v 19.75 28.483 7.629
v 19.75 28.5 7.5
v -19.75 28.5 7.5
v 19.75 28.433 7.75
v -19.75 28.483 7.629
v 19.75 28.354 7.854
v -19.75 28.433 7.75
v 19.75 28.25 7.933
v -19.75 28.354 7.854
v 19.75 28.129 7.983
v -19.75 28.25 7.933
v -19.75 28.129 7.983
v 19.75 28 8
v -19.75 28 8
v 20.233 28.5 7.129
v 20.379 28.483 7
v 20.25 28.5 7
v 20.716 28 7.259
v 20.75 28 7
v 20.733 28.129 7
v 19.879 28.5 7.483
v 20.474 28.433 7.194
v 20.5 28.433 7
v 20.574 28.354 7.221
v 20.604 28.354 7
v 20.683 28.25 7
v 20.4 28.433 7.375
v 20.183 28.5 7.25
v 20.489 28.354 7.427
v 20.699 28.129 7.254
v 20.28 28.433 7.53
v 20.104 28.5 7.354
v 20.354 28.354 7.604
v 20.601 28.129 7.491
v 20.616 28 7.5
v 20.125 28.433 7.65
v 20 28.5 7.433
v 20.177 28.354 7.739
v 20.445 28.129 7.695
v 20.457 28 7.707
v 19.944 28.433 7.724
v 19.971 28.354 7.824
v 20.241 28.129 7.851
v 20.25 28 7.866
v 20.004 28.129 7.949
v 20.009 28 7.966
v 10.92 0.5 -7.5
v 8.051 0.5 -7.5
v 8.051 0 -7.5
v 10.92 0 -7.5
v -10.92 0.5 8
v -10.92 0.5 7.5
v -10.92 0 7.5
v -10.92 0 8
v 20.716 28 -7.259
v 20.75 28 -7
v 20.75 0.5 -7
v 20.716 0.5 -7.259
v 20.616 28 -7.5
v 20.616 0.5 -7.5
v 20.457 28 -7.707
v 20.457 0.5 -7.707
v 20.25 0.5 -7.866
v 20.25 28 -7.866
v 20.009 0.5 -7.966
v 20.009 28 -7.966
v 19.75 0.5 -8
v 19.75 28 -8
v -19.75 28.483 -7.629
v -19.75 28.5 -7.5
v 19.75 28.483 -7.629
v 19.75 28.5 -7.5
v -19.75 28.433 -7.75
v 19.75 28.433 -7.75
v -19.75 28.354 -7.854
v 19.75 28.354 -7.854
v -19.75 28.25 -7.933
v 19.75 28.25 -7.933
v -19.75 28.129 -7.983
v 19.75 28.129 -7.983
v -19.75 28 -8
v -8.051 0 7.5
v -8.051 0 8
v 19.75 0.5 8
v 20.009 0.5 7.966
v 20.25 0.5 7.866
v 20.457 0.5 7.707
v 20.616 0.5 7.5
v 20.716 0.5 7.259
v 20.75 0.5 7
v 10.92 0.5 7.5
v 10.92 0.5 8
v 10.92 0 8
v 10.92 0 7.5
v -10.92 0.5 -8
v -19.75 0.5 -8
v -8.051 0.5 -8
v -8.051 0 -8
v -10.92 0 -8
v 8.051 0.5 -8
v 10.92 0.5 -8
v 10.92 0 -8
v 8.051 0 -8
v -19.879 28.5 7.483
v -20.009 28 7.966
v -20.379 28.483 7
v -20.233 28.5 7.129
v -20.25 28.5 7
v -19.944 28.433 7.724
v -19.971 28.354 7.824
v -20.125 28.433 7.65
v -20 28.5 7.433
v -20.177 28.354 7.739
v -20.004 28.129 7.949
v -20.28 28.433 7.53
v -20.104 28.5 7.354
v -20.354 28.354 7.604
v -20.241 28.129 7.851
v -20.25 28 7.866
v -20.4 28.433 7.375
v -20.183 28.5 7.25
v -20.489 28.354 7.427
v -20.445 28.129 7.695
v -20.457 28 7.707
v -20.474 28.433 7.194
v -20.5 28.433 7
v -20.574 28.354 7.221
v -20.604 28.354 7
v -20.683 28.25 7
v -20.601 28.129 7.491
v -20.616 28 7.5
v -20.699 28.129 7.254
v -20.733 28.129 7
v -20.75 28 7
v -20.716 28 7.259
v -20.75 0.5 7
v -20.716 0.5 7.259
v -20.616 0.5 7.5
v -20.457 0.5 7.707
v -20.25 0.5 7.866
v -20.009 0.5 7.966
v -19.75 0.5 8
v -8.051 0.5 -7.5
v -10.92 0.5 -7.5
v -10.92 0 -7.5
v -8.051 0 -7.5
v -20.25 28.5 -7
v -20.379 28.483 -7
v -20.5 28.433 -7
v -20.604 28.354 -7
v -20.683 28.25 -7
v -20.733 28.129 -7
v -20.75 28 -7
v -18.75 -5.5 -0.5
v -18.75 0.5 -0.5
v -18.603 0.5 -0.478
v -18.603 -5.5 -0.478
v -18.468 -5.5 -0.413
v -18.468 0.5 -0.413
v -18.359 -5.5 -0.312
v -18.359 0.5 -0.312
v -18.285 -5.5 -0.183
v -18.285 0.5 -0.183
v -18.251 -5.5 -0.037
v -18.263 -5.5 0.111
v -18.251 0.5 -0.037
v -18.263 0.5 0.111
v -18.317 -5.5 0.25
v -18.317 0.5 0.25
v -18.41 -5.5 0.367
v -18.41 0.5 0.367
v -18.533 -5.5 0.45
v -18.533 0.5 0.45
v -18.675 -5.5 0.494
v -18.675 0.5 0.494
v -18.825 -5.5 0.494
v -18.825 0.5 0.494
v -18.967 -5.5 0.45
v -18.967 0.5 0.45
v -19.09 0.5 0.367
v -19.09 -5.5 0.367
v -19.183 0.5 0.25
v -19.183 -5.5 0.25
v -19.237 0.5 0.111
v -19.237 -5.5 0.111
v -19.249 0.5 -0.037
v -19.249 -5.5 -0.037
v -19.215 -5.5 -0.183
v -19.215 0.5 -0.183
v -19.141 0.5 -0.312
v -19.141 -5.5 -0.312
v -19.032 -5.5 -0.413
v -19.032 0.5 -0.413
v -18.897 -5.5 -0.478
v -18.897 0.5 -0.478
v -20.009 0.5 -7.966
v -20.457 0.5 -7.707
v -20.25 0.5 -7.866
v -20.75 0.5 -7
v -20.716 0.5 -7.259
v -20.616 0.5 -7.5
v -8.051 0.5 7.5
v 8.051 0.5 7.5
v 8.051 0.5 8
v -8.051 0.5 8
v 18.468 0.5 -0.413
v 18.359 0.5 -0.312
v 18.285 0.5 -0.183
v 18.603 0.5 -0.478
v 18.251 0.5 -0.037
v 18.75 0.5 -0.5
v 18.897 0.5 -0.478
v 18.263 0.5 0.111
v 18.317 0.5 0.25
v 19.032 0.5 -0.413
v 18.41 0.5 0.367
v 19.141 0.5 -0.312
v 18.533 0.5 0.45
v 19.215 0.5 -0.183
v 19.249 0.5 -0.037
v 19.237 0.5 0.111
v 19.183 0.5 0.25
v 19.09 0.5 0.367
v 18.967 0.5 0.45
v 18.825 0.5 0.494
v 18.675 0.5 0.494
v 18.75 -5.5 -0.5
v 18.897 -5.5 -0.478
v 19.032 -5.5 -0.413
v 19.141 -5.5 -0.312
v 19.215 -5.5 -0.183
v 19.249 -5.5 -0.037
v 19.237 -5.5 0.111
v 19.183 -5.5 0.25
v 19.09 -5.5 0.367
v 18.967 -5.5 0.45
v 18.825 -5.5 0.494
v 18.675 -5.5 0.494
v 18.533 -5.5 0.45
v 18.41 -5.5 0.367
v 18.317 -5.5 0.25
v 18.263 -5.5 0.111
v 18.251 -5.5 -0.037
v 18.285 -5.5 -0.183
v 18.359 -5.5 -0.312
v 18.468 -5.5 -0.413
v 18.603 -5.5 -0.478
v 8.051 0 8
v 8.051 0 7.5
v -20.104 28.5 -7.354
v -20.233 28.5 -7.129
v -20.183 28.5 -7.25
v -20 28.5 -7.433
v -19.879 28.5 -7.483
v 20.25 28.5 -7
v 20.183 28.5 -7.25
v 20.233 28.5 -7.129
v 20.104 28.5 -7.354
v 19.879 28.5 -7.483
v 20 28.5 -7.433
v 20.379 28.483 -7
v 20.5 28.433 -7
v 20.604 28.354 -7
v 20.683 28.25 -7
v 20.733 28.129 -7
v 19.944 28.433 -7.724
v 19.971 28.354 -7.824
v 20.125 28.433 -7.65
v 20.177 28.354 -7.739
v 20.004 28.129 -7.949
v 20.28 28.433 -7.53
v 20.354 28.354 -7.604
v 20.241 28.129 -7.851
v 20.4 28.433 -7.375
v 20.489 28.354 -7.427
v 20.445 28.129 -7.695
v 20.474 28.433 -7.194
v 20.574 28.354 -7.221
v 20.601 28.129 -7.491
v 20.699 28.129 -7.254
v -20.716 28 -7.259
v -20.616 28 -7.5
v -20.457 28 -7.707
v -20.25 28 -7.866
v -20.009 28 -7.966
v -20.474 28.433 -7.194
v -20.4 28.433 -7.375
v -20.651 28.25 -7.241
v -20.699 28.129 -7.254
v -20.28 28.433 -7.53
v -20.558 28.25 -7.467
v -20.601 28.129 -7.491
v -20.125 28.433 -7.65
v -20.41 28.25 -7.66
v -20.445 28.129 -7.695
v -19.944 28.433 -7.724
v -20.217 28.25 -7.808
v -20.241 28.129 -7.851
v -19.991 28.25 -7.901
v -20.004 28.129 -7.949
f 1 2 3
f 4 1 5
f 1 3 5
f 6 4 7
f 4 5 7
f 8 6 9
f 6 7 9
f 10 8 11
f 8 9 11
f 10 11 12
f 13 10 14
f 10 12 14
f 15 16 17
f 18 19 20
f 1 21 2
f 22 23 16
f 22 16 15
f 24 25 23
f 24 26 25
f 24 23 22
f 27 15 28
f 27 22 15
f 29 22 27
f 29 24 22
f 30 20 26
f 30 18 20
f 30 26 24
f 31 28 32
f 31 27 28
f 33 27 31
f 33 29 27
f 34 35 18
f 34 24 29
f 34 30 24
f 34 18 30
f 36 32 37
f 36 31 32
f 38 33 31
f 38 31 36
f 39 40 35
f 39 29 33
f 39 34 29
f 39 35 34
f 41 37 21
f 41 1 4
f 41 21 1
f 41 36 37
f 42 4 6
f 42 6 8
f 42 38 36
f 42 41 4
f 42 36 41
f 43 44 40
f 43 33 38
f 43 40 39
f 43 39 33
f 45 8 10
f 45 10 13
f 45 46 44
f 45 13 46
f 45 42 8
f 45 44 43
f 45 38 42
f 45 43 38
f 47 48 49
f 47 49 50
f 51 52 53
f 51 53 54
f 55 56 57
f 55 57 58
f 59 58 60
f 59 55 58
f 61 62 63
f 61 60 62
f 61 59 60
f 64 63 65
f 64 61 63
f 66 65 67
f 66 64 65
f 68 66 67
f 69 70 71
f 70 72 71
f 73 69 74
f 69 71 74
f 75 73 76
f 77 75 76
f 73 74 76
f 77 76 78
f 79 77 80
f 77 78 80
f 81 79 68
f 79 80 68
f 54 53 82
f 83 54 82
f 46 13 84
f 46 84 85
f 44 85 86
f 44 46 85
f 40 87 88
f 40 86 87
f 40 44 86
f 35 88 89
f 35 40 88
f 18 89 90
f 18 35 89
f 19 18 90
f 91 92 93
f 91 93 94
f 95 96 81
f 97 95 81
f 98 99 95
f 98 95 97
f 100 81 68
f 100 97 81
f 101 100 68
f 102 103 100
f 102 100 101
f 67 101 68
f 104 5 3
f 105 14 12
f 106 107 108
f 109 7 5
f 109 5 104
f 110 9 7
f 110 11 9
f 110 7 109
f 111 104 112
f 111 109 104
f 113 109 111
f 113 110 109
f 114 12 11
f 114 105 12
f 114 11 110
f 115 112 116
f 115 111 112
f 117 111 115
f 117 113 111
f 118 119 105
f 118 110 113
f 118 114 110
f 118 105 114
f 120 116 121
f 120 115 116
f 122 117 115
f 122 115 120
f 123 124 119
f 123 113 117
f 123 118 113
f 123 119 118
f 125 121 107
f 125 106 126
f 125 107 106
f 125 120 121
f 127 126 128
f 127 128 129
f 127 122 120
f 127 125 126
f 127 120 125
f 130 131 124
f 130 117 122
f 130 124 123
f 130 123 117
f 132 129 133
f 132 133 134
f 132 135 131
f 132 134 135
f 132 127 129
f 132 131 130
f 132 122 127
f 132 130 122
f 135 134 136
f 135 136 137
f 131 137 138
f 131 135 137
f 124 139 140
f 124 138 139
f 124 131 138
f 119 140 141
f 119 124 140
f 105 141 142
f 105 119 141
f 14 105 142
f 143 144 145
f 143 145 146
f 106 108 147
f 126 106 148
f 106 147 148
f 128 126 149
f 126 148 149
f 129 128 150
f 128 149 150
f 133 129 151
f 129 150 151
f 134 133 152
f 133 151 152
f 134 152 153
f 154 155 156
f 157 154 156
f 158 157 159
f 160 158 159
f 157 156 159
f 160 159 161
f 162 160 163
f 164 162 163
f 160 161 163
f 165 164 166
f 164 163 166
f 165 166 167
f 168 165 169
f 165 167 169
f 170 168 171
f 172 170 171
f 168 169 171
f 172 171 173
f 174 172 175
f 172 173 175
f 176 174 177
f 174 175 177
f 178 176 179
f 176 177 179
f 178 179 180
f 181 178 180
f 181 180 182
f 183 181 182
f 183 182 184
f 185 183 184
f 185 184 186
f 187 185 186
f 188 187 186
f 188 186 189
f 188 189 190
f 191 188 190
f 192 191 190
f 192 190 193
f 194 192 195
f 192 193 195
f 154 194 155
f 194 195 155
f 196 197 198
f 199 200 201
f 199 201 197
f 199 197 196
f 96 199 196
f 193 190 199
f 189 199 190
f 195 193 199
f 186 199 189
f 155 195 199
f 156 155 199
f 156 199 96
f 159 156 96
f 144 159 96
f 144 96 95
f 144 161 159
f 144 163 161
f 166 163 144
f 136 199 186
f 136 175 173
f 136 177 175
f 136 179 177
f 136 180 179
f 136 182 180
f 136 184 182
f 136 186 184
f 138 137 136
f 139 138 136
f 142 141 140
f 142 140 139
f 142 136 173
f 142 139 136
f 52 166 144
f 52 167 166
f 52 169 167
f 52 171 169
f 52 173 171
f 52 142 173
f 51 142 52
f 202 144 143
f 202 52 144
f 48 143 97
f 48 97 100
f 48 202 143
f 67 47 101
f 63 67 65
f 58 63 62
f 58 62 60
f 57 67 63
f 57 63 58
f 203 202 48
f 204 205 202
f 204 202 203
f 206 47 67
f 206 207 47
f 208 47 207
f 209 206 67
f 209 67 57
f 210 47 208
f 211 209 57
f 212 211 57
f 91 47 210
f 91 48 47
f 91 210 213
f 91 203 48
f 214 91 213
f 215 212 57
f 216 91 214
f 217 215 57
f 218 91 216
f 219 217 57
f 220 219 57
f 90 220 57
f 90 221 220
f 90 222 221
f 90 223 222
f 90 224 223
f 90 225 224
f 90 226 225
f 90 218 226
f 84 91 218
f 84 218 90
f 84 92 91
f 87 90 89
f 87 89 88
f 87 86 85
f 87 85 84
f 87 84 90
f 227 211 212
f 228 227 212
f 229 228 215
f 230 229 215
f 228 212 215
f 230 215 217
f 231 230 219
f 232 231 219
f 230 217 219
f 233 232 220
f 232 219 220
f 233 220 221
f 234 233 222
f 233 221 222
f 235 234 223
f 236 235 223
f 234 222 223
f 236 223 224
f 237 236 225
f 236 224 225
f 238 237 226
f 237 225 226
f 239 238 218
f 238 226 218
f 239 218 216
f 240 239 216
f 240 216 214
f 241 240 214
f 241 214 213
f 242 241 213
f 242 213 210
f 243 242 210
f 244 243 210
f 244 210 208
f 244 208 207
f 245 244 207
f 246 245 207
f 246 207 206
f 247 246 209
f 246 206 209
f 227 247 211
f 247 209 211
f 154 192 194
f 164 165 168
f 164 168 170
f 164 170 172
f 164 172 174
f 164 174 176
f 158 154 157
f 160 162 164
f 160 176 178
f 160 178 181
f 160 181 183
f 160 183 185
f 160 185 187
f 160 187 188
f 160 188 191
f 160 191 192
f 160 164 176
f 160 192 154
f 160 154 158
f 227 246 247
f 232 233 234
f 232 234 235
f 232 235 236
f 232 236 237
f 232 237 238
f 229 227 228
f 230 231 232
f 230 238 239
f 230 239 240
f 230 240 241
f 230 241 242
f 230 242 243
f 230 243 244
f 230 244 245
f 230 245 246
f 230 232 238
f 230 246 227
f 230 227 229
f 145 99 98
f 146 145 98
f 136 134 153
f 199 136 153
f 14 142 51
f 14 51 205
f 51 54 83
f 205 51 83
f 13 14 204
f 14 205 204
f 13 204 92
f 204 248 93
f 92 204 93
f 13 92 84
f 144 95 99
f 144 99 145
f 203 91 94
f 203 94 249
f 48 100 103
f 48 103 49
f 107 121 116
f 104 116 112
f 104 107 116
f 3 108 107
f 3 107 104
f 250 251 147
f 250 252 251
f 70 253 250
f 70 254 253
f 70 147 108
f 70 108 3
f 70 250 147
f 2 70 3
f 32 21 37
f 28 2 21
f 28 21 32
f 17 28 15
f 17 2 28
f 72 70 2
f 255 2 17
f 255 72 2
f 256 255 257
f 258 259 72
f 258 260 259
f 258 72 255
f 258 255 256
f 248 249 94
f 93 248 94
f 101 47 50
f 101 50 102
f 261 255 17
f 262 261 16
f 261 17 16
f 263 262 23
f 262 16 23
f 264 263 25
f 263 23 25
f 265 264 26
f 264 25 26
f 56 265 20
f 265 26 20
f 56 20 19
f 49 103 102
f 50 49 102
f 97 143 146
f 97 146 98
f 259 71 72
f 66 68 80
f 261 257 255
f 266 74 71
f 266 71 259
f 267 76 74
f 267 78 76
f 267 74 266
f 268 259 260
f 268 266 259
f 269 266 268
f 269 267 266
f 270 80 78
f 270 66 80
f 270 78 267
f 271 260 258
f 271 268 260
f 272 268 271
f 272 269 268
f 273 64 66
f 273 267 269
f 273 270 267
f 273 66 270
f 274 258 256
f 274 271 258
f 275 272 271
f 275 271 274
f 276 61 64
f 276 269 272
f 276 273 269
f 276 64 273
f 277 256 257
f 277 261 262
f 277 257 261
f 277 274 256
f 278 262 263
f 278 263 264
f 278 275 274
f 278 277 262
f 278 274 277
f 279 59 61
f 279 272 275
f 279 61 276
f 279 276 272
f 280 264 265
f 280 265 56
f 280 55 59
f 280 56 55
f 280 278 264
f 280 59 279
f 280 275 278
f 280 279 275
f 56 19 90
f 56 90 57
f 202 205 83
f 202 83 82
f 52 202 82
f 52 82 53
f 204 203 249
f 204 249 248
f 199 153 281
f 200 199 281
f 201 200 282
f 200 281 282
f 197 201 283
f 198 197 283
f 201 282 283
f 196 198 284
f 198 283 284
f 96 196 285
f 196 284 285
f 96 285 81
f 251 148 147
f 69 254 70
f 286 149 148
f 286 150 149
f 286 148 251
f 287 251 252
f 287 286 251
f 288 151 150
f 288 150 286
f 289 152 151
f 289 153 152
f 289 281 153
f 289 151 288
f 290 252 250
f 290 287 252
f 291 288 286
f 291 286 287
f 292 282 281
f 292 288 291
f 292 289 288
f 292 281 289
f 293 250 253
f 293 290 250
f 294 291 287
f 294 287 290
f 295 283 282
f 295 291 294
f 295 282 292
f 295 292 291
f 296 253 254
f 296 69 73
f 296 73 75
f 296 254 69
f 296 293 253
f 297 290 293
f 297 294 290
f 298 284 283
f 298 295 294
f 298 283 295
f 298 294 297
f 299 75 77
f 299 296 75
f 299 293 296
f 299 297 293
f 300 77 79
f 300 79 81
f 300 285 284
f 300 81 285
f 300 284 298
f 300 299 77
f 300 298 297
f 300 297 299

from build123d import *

# Parameters (mm, degrees)
SKETCH_1_W          = 41.5
SKETCH_1_H          = 16
EXTRUDE_1_DEPTH     = 28.5
FILLET_1_R          = 1
FILLET_2_R          = 0.5
CUT_EXTRUDE_START   = -0.5
CUT_EXTRUDE_1_DEPTH = 0.5
SKETCH_4_R          = 0.5
EXTRUDE_2_DEPTH     = 6


with BuildPart() as part:
    # Эскиз1 → Бобышка-Вытянуть1 (new body)
    with BuildSketch(Plane(origin=(0, 0, 0), x_dir=(1, 0, 0), z_dir=(0, 1, 0))):
        Rectangle(SKETCH_1_W, SKETCH_1_H)
    extrude(amount=EXTRUDE_1_DEPTH)

    # Скругление1
    fillet_1_edges = [part.edges().sort_by_distance(p)[0] for p in [
        (20.75, 14.25, 8),
        (-20.75, 14.25, 8),
        (-20.75, 14.25, -8),
        (20.75, 14.25, -8),
    ]]
    fillet(fillet_1_edges, radius=FILLET_1_R)

    # Скругление2
    fillet_2_edges = [part.edges().sort_by_distance(p)[0] for p in [
        (0, 28.5, -8),
        (20.75, 28.5, 0),
        (-20.75, 28.5, 0),
        (0, 28.5, 8),
        (-20.457106781, 28.5, 7.707106781),
        (-20.457106781, 28.5, -7.707106781),
        (20.457106781, 28.5, 7.707106781),
        (20.457106781, 28.5, -7.707106781),
    ]]
    fillet(fillet_2_edges, radius=FILLET_2_R)

    # Эскиз3 → Вырез-Вытянуть1 (cut)
    with BuildSketch(Plane.XZ.offset(CUT_EXTRUDE_START)):
        with BuildLine():
            Line((-10.920111581, 7.5), (-10.920111581, 8))
            Line((-10.920111581, 8), (-19.75, 8))
            ThreePointArc((-19.75, 8), (-20.457106781, 7.707106781), (-20.75, 7))
            Line((-20.75, 7), (-20.75, -7))
            ThreePointArc((-20.75, -7), (-20.457106781, -7.707106781), (-19.75, -8))
            Line((-19.75, -8), (-10.920111581, -8))
            Line((-10.920111581, -8), (-10.920111581, -7.5))
            Line((-10.920111581, -7.5), (-8.050796548, -7.5))
            Line((-8.050796548, -7.5), (-8.050796548, -8))
            Line((-8.050796548, -8), (8.050796548, -8))
            Line((8.050796548, -8), (8.050796548, -7.5))
            Line((8.050796548, -7.5), (10.920111581, -7.5))
            Line((10.920111581, -7.5), (10.920111581, -8))
            Line((10.920111581, -8), (19.75, -8))
            ThreePointArc((19.75, -8), (20.457106781, -7.707106781), (20.75, -7))
            Line((20.75, -7), (20.75, 7))
            ThreePointArc((20.75, 7), (20.457106781, 7.707106781), (19.75, 8))
            Line((19.75, 8), (10.920111581, 8))
            Line((10.920111581, 8), (10.920111581, 7.5))
            Line((10.920111581, 7.5), (8.050796548, 7.5))
            Line((8.050796548, 7.5), (8.050796548, 8))
            Line((8.050796548, 8), (-8.050796548, 8))
            Line((-8.050796548, 8), (-8.050796548, 7.5))
            Line((-8.050796548, 7.5), (-10.920111581, 7.5))
        make_face()
    extrude(amount=CUT_EXTRUDE_1_DEPTH, mode=Mode.SUBTRACT)

    # Эскиз4 → Бобышка-Вытянуть2 (add)
    with BuildSketch(Plane.XZ.offset(-0.5)):
        with Locations(Location((-18.75, 0, 0), (0, 0, 270))):
            Circle(SKETCH_4_R)
        with Locations(Location((18.75, 0, 0), (0, 0, 270))):
            Circle(SKETCH_4_R)
    extrude(amount=EXTRUDE_2_DEPTH)


solid = part.part
